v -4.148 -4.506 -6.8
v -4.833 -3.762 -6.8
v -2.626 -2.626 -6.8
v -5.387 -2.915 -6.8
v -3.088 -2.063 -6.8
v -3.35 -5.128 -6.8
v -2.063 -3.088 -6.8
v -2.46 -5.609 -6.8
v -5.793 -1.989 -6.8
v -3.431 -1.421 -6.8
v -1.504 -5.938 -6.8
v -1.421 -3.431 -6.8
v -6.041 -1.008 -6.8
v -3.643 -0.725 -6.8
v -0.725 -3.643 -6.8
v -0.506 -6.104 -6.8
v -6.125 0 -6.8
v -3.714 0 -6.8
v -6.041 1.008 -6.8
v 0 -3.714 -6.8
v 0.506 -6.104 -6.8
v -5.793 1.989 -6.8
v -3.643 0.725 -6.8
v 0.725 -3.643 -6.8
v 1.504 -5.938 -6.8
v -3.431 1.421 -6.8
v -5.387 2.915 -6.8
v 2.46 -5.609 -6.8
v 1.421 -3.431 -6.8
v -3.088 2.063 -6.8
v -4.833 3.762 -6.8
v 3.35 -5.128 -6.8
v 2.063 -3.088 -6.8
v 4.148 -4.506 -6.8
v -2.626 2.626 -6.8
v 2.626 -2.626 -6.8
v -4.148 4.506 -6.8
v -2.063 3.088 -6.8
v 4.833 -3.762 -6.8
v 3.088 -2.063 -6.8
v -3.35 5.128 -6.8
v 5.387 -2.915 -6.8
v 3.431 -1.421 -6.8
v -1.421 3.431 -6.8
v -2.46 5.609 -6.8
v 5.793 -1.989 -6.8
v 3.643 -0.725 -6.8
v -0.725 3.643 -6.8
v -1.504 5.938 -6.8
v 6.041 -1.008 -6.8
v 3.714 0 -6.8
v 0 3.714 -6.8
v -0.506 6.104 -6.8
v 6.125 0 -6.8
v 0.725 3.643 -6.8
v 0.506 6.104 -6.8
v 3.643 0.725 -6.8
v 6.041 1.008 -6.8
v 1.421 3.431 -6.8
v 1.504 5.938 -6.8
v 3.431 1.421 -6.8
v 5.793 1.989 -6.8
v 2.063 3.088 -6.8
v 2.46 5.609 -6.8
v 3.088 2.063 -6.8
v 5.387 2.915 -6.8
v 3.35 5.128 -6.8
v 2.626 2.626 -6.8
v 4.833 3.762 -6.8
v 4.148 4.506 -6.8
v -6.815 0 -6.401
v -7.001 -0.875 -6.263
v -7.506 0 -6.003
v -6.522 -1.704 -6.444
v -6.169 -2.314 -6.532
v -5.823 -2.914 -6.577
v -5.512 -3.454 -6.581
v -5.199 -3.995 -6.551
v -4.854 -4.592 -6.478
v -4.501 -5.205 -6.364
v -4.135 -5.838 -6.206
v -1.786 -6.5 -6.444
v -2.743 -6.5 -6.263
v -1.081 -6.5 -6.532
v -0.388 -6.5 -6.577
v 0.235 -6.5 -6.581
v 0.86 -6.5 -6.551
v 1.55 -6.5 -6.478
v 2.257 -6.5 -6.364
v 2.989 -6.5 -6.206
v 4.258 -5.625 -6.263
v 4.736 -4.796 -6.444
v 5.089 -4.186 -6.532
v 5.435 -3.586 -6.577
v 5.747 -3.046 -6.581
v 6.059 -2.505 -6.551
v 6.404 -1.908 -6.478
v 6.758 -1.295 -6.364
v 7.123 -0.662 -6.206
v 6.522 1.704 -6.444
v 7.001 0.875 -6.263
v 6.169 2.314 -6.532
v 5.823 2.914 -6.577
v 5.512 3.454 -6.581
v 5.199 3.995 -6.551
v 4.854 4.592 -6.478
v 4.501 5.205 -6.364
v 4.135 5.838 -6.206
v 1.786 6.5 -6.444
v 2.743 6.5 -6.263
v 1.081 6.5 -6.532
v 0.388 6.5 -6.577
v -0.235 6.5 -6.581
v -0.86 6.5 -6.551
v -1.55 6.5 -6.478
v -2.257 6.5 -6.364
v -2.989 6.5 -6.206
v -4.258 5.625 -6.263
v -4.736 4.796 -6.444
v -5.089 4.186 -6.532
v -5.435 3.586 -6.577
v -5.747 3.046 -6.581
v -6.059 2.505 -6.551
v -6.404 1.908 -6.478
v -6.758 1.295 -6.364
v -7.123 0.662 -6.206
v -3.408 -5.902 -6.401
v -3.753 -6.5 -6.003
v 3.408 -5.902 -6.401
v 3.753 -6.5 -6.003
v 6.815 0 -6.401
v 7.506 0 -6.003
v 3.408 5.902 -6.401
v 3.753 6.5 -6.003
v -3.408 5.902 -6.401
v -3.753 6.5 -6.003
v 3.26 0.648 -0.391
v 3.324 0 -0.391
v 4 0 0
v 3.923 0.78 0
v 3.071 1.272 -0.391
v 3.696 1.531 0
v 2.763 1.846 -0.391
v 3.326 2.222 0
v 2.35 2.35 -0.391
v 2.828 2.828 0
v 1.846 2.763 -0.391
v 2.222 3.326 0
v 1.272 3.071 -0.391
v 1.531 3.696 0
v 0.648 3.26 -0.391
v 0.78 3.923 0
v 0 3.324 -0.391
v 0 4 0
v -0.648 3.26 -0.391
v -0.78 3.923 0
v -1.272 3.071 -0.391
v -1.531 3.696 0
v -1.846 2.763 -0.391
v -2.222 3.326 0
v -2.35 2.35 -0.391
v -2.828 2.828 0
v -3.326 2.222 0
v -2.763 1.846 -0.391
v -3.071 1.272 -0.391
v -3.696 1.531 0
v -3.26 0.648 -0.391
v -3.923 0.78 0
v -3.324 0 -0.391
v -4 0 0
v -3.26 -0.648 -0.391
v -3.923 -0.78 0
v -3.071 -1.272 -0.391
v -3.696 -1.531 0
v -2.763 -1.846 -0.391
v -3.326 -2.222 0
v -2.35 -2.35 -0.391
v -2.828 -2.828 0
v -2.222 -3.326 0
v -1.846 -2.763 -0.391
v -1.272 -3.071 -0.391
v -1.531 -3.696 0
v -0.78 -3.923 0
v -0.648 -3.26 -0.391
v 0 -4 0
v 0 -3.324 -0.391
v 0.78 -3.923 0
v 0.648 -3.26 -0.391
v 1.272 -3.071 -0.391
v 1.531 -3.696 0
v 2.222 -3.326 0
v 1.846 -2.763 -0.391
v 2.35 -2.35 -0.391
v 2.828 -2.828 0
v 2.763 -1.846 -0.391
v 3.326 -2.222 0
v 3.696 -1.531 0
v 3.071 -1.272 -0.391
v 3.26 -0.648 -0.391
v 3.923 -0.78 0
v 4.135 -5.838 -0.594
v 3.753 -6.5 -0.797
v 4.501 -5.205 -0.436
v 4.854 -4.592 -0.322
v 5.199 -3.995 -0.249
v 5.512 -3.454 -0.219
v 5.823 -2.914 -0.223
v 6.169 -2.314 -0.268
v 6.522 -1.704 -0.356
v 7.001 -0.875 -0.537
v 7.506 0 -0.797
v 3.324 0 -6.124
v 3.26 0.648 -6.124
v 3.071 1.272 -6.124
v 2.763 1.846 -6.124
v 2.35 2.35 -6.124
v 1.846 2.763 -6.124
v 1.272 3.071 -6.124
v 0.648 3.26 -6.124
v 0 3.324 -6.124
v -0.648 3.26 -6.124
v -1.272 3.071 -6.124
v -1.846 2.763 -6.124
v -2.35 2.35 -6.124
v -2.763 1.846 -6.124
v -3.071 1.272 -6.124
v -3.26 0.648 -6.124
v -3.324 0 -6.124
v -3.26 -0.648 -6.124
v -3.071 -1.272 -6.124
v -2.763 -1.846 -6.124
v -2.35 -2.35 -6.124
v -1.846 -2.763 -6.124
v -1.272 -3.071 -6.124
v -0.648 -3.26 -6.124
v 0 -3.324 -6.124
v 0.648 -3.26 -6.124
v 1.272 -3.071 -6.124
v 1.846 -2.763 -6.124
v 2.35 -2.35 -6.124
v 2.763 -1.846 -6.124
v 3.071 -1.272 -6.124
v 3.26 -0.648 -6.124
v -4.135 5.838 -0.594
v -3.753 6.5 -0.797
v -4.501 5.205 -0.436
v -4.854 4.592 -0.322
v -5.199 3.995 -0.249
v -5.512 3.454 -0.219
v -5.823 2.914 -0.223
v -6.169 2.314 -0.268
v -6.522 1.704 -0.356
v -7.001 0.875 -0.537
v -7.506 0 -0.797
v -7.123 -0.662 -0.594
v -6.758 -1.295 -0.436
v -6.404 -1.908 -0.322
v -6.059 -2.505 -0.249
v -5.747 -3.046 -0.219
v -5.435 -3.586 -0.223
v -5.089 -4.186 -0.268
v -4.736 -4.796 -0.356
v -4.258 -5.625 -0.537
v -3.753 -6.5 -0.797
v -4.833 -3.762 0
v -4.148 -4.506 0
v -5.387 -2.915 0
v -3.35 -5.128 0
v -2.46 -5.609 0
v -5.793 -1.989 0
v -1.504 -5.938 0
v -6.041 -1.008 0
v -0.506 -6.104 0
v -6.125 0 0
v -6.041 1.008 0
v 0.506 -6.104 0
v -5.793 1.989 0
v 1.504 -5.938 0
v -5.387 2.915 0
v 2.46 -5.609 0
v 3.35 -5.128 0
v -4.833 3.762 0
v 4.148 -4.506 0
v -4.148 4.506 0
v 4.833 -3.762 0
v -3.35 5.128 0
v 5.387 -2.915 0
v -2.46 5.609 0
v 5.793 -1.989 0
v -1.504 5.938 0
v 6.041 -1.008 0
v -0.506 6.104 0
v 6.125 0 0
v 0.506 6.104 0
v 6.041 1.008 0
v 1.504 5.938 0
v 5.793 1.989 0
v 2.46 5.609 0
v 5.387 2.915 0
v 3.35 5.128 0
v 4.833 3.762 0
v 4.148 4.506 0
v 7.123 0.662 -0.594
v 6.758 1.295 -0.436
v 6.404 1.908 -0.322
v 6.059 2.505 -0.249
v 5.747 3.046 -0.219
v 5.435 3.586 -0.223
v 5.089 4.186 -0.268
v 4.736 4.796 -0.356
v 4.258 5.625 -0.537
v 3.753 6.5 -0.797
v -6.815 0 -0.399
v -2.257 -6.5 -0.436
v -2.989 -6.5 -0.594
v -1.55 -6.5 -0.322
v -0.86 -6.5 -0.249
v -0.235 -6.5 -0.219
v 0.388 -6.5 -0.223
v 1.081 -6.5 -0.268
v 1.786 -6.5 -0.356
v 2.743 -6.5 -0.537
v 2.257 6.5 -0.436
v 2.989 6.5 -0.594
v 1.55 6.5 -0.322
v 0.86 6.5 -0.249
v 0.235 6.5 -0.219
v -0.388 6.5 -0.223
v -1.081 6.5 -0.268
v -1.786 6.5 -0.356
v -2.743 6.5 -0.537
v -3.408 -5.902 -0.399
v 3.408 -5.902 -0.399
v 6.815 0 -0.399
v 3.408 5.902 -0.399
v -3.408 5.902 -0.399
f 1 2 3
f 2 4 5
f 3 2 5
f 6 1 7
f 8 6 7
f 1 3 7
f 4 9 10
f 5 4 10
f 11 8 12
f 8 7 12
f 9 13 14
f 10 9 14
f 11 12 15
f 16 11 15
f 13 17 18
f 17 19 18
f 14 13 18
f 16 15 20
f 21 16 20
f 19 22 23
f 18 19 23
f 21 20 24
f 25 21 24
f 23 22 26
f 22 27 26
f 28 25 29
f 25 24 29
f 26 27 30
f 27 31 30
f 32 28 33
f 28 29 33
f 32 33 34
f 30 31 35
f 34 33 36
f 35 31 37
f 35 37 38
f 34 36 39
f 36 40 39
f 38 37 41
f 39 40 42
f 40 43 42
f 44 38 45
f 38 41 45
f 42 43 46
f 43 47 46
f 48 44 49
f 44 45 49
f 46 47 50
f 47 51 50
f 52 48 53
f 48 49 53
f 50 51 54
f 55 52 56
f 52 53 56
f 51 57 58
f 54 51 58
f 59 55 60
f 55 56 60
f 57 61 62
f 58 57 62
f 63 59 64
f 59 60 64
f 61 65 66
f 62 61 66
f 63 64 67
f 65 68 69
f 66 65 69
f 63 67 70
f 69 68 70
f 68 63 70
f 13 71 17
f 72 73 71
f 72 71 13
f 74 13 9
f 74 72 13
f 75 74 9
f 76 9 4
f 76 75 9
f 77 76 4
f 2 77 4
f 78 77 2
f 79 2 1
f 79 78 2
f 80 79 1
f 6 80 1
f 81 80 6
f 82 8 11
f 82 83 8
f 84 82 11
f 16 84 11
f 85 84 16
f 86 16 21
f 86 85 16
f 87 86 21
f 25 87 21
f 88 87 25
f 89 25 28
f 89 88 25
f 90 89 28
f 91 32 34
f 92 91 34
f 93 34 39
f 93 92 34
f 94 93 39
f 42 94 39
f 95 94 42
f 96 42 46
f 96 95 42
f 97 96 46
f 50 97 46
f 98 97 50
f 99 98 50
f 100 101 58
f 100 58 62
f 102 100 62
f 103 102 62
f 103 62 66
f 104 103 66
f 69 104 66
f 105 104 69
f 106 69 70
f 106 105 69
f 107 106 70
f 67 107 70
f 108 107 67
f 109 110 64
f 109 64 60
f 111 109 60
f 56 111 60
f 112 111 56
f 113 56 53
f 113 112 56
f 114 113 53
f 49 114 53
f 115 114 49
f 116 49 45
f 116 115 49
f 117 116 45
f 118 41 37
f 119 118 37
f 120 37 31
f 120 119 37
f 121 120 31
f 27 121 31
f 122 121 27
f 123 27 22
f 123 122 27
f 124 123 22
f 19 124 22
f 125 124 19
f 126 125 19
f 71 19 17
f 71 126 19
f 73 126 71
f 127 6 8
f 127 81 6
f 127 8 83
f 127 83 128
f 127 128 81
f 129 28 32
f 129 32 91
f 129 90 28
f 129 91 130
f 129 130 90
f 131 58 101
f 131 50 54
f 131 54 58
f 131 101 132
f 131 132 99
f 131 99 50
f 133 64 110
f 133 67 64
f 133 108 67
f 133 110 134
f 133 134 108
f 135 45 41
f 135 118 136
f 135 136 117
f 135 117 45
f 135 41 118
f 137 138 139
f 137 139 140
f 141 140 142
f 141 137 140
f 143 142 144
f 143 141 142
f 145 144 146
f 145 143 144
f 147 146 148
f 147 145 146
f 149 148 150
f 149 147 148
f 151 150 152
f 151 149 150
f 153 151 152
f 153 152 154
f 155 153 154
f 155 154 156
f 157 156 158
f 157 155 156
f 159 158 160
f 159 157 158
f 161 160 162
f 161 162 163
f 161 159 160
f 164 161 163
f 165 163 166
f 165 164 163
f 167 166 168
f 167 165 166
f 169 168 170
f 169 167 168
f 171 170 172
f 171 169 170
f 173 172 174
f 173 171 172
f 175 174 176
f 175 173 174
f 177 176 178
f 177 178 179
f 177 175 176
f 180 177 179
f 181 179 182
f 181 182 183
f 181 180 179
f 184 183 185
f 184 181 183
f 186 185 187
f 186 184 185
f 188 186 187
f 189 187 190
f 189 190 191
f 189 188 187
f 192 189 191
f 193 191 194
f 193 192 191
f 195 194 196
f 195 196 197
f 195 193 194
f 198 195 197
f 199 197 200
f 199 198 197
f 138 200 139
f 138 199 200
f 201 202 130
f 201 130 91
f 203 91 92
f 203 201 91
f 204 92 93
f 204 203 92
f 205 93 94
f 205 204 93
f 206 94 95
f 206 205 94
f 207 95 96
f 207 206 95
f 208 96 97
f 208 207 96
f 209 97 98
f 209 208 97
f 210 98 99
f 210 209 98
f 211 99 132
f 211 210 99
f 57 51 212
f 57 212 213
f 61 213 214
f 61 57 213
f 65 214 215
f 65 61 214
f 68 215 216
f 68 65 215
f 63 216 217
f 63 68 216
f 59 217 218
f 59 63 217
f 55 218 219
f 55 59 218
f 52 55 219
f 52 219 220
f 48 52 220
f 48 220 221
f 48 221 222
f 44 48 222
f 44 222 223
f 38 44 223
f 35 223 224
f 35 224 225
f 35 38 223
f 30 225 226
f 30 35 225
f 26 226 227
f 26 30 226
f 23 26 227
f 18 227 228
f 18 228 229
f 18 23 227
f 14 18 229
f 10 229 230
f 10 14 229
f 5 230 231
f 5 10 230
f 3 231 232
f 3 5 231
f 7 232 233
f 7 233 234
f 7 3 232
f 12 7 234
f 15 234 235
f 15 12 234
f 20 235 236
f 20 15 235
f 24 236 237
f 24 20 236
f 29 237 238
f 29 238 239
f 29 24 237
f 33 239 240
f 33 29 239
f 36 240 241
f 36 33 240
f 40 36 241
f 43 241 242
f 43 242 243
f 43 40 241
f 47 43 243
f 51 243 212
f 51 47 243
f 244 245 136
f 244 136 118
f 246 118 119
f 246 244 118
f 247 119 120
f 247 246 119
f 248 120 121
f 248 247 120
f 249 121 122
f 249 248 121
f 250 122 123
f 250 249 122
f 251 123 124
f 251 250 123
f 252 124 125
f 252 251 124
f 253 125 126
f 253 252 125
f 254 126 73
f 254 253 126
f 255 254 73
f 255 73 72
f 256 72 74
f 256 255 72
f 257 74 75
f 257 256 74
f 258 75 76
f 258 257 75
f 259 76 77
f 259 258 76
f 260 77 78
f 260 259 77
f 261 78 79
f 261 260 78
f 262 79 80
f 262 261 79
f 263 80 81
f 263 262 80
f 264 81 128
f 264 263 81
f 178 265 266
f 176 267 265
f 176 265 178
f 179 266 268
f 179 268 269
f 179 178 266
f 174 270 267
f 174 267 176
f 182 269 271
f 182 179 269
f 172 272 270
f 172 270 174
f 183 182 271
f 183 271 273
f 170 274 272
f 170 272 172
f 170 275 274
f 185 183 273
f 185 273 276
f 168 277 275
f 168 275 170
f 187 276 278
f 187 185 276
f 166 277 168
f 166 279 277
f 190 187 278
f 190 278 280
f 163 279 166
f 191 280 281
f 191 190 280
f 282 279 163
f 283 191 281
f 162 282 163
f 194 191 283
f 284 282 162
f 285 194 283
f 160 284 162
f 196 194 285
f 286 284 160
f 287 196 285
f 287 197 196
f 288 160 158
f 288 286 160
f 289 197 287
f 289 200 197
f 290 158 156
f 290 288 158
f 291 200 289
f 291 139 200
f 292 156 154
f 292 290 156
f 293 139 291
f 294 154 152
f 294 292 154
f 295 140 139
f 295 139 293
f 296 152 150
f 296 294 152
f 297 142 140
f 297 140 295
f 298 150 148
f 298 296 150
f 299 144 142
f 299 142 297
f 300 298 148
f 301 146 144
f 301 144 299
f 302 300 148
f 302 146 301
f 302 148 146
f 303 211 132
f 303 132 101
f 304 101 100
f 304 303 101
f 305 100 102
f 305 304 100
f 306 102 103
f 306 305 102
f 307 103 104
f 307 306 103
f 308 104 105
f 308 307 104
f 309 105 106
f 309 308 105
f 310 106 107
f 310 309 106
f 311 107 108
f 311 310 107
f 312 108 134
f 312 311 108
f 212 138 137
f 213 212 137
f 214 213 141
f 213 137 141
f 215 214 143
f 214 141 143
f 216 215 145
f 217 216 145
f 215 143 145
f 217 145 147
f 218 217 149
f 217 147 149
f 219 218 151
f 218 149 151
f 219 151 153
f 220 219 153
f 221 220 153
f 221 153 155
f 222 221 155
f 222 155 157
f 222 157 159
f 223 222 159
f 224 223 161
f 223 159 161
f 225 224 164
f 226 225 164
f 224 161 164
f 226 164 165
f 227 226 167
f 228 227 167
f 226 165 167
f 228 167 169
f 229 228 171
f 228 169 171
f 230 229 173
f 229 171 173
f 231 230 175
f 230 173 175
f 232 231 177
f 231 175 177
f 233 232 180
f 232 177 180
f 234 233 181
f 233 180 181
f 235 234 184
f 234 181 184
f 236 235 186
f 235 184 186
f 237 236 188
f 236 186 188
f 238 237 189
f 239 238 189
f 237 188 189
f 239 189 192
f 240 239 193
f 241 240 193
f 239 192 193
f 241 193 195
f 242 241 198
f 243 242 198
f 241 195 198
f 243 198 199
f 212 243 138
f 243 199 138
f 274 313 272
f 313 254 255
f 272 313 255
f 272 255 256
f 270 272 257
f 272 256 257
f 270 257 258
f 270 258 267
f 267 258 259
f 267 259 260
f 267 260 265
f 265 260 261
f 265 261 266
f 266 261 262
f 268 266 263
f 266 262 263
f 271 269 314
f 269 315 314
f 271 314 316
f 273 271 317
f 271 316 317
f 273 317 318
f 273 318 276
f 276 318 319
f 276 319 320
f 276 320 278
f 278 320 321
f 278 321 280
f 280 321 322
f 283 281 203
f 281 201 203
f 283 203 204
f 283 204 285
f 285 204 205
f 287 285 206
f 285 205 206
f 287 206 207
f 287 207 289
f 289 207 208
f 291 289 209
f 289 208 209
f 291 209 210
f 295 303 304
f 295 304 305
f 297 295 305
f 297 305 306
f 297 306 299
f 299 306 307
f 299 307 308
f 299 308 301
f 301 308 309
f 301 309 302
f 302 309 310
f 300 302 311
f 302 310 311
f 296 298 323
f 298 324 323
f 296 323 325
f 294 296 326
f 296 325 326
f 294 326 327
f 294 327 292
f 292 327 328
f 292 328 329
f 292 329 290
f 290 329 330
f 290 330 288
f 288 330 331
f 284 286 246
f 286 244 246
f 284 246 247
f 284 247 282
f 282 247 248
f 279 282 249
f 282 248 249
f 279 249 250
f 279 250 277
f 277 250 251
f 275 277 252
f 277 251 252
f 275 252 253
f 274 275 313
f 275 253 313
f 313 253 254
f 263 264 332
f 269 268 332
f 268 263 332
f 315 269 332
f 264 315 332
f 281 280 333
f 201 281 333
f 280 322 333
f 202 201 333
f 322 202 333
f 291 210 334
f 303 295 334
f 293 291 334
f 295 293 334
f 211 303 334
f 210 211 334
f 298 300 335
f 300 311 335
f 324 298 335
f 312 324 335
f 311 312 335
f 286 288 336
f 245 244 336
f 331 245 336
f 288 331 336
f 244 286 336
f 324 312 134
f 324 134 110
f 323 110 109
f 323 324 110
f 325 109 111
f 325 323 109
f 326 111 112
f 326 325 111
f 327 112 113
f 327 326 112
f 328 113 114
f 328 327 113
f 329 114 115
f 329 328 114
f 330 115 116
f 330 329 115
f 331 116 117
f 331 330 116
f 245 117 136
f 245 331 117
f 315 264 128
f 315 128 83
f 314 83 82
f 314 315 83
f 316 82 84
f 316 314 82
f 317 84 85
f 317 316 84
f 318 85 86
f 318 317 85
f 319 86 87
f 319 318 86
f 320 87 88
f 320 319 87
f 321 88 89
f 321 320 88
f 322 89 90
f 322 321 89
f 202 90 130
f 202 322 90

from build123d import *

# Parameters (mm, degrees)
SKETCH1_R               = 3.3235
BASENUT_DEPTH           = 6.8
ENDCHAMFER_SIZE         = 0.6765
ENDCHAMFER_SIZE2        = 0.390577457
ENDCHAMFER_PART_2_SIZE  = 0.6765
ENDCHAMFER_PART_2_SIZE2 = 0.390577457


with BuildPart() as part:
    # Sketch1 → BaseNut (new body)
    with BuildSketch(Plane.XY):
        Polygon((7.505553499, 0), (3.75277675, 6.5), (-3.75277675, 6.5), (-7.505553499, 0), (-3.75277675, -6.5), (3.75277675, -6.5), align=None)
        Circle(SKETCH1_R, mode=Mode.SUBTRACT)
    extrude(amount=-BASENUT_DEPTH)

    # Sketch2 → Double-Chamfer (revolve, cut)
    with BuildSketch(Plane(origin=(0, 0, 0), x_dir=(1, 0, 0), z_dir=(0, 1, 0))):
        Polygon((-7.505553499, 6.8), (-6.125, 6.8), (-7.505553499, 6.002937065), align=None)
        Polygon((-7.505553499, 0.797062935), (-7.505553499, 0), (-6.125, 0), align=None)
    revolve(axis=Axis((0, 0, -3.375940562), (0, 0, 1)), mode=Mode.SUBTRACT)

    # EndChamfer
    endchamfer_edges = [part.edges().sort_by_distance(p)[0] for p in [
        (-3.3235, 0, -6.8),
    ]]
    endchamfer_side = [part.faces().sort_by_distance(p)[0] for p in [
        (-3.3235, 0, -3.4),
    ]]
    chamfer(endchamfer_edges, length=ENDCHAMFER_SIZE, length2=ENDCHAMFER_SIZE2, reference=endchamfer_side[0])

    # EndChamfer part 2
    endchamfer_part_2_edges = [part.edges().sort_by_distance(p)[0] for p in [
        (-3.3235, 0, 0),
    ]]
    endchamfer_part_2_side = [part.faces().sort_by_distance(p)[0] for p in [
        (5.951758839, 0, 0),
    ]]
    chamfer(endchamfer_part_2_edges, length=ENDCHAMFER_PART_2_SIZE, length2=ENDCHAMFER_PART_2_SIZE2, reference=endchamfer_part_2_side[0])


solid = part.part
